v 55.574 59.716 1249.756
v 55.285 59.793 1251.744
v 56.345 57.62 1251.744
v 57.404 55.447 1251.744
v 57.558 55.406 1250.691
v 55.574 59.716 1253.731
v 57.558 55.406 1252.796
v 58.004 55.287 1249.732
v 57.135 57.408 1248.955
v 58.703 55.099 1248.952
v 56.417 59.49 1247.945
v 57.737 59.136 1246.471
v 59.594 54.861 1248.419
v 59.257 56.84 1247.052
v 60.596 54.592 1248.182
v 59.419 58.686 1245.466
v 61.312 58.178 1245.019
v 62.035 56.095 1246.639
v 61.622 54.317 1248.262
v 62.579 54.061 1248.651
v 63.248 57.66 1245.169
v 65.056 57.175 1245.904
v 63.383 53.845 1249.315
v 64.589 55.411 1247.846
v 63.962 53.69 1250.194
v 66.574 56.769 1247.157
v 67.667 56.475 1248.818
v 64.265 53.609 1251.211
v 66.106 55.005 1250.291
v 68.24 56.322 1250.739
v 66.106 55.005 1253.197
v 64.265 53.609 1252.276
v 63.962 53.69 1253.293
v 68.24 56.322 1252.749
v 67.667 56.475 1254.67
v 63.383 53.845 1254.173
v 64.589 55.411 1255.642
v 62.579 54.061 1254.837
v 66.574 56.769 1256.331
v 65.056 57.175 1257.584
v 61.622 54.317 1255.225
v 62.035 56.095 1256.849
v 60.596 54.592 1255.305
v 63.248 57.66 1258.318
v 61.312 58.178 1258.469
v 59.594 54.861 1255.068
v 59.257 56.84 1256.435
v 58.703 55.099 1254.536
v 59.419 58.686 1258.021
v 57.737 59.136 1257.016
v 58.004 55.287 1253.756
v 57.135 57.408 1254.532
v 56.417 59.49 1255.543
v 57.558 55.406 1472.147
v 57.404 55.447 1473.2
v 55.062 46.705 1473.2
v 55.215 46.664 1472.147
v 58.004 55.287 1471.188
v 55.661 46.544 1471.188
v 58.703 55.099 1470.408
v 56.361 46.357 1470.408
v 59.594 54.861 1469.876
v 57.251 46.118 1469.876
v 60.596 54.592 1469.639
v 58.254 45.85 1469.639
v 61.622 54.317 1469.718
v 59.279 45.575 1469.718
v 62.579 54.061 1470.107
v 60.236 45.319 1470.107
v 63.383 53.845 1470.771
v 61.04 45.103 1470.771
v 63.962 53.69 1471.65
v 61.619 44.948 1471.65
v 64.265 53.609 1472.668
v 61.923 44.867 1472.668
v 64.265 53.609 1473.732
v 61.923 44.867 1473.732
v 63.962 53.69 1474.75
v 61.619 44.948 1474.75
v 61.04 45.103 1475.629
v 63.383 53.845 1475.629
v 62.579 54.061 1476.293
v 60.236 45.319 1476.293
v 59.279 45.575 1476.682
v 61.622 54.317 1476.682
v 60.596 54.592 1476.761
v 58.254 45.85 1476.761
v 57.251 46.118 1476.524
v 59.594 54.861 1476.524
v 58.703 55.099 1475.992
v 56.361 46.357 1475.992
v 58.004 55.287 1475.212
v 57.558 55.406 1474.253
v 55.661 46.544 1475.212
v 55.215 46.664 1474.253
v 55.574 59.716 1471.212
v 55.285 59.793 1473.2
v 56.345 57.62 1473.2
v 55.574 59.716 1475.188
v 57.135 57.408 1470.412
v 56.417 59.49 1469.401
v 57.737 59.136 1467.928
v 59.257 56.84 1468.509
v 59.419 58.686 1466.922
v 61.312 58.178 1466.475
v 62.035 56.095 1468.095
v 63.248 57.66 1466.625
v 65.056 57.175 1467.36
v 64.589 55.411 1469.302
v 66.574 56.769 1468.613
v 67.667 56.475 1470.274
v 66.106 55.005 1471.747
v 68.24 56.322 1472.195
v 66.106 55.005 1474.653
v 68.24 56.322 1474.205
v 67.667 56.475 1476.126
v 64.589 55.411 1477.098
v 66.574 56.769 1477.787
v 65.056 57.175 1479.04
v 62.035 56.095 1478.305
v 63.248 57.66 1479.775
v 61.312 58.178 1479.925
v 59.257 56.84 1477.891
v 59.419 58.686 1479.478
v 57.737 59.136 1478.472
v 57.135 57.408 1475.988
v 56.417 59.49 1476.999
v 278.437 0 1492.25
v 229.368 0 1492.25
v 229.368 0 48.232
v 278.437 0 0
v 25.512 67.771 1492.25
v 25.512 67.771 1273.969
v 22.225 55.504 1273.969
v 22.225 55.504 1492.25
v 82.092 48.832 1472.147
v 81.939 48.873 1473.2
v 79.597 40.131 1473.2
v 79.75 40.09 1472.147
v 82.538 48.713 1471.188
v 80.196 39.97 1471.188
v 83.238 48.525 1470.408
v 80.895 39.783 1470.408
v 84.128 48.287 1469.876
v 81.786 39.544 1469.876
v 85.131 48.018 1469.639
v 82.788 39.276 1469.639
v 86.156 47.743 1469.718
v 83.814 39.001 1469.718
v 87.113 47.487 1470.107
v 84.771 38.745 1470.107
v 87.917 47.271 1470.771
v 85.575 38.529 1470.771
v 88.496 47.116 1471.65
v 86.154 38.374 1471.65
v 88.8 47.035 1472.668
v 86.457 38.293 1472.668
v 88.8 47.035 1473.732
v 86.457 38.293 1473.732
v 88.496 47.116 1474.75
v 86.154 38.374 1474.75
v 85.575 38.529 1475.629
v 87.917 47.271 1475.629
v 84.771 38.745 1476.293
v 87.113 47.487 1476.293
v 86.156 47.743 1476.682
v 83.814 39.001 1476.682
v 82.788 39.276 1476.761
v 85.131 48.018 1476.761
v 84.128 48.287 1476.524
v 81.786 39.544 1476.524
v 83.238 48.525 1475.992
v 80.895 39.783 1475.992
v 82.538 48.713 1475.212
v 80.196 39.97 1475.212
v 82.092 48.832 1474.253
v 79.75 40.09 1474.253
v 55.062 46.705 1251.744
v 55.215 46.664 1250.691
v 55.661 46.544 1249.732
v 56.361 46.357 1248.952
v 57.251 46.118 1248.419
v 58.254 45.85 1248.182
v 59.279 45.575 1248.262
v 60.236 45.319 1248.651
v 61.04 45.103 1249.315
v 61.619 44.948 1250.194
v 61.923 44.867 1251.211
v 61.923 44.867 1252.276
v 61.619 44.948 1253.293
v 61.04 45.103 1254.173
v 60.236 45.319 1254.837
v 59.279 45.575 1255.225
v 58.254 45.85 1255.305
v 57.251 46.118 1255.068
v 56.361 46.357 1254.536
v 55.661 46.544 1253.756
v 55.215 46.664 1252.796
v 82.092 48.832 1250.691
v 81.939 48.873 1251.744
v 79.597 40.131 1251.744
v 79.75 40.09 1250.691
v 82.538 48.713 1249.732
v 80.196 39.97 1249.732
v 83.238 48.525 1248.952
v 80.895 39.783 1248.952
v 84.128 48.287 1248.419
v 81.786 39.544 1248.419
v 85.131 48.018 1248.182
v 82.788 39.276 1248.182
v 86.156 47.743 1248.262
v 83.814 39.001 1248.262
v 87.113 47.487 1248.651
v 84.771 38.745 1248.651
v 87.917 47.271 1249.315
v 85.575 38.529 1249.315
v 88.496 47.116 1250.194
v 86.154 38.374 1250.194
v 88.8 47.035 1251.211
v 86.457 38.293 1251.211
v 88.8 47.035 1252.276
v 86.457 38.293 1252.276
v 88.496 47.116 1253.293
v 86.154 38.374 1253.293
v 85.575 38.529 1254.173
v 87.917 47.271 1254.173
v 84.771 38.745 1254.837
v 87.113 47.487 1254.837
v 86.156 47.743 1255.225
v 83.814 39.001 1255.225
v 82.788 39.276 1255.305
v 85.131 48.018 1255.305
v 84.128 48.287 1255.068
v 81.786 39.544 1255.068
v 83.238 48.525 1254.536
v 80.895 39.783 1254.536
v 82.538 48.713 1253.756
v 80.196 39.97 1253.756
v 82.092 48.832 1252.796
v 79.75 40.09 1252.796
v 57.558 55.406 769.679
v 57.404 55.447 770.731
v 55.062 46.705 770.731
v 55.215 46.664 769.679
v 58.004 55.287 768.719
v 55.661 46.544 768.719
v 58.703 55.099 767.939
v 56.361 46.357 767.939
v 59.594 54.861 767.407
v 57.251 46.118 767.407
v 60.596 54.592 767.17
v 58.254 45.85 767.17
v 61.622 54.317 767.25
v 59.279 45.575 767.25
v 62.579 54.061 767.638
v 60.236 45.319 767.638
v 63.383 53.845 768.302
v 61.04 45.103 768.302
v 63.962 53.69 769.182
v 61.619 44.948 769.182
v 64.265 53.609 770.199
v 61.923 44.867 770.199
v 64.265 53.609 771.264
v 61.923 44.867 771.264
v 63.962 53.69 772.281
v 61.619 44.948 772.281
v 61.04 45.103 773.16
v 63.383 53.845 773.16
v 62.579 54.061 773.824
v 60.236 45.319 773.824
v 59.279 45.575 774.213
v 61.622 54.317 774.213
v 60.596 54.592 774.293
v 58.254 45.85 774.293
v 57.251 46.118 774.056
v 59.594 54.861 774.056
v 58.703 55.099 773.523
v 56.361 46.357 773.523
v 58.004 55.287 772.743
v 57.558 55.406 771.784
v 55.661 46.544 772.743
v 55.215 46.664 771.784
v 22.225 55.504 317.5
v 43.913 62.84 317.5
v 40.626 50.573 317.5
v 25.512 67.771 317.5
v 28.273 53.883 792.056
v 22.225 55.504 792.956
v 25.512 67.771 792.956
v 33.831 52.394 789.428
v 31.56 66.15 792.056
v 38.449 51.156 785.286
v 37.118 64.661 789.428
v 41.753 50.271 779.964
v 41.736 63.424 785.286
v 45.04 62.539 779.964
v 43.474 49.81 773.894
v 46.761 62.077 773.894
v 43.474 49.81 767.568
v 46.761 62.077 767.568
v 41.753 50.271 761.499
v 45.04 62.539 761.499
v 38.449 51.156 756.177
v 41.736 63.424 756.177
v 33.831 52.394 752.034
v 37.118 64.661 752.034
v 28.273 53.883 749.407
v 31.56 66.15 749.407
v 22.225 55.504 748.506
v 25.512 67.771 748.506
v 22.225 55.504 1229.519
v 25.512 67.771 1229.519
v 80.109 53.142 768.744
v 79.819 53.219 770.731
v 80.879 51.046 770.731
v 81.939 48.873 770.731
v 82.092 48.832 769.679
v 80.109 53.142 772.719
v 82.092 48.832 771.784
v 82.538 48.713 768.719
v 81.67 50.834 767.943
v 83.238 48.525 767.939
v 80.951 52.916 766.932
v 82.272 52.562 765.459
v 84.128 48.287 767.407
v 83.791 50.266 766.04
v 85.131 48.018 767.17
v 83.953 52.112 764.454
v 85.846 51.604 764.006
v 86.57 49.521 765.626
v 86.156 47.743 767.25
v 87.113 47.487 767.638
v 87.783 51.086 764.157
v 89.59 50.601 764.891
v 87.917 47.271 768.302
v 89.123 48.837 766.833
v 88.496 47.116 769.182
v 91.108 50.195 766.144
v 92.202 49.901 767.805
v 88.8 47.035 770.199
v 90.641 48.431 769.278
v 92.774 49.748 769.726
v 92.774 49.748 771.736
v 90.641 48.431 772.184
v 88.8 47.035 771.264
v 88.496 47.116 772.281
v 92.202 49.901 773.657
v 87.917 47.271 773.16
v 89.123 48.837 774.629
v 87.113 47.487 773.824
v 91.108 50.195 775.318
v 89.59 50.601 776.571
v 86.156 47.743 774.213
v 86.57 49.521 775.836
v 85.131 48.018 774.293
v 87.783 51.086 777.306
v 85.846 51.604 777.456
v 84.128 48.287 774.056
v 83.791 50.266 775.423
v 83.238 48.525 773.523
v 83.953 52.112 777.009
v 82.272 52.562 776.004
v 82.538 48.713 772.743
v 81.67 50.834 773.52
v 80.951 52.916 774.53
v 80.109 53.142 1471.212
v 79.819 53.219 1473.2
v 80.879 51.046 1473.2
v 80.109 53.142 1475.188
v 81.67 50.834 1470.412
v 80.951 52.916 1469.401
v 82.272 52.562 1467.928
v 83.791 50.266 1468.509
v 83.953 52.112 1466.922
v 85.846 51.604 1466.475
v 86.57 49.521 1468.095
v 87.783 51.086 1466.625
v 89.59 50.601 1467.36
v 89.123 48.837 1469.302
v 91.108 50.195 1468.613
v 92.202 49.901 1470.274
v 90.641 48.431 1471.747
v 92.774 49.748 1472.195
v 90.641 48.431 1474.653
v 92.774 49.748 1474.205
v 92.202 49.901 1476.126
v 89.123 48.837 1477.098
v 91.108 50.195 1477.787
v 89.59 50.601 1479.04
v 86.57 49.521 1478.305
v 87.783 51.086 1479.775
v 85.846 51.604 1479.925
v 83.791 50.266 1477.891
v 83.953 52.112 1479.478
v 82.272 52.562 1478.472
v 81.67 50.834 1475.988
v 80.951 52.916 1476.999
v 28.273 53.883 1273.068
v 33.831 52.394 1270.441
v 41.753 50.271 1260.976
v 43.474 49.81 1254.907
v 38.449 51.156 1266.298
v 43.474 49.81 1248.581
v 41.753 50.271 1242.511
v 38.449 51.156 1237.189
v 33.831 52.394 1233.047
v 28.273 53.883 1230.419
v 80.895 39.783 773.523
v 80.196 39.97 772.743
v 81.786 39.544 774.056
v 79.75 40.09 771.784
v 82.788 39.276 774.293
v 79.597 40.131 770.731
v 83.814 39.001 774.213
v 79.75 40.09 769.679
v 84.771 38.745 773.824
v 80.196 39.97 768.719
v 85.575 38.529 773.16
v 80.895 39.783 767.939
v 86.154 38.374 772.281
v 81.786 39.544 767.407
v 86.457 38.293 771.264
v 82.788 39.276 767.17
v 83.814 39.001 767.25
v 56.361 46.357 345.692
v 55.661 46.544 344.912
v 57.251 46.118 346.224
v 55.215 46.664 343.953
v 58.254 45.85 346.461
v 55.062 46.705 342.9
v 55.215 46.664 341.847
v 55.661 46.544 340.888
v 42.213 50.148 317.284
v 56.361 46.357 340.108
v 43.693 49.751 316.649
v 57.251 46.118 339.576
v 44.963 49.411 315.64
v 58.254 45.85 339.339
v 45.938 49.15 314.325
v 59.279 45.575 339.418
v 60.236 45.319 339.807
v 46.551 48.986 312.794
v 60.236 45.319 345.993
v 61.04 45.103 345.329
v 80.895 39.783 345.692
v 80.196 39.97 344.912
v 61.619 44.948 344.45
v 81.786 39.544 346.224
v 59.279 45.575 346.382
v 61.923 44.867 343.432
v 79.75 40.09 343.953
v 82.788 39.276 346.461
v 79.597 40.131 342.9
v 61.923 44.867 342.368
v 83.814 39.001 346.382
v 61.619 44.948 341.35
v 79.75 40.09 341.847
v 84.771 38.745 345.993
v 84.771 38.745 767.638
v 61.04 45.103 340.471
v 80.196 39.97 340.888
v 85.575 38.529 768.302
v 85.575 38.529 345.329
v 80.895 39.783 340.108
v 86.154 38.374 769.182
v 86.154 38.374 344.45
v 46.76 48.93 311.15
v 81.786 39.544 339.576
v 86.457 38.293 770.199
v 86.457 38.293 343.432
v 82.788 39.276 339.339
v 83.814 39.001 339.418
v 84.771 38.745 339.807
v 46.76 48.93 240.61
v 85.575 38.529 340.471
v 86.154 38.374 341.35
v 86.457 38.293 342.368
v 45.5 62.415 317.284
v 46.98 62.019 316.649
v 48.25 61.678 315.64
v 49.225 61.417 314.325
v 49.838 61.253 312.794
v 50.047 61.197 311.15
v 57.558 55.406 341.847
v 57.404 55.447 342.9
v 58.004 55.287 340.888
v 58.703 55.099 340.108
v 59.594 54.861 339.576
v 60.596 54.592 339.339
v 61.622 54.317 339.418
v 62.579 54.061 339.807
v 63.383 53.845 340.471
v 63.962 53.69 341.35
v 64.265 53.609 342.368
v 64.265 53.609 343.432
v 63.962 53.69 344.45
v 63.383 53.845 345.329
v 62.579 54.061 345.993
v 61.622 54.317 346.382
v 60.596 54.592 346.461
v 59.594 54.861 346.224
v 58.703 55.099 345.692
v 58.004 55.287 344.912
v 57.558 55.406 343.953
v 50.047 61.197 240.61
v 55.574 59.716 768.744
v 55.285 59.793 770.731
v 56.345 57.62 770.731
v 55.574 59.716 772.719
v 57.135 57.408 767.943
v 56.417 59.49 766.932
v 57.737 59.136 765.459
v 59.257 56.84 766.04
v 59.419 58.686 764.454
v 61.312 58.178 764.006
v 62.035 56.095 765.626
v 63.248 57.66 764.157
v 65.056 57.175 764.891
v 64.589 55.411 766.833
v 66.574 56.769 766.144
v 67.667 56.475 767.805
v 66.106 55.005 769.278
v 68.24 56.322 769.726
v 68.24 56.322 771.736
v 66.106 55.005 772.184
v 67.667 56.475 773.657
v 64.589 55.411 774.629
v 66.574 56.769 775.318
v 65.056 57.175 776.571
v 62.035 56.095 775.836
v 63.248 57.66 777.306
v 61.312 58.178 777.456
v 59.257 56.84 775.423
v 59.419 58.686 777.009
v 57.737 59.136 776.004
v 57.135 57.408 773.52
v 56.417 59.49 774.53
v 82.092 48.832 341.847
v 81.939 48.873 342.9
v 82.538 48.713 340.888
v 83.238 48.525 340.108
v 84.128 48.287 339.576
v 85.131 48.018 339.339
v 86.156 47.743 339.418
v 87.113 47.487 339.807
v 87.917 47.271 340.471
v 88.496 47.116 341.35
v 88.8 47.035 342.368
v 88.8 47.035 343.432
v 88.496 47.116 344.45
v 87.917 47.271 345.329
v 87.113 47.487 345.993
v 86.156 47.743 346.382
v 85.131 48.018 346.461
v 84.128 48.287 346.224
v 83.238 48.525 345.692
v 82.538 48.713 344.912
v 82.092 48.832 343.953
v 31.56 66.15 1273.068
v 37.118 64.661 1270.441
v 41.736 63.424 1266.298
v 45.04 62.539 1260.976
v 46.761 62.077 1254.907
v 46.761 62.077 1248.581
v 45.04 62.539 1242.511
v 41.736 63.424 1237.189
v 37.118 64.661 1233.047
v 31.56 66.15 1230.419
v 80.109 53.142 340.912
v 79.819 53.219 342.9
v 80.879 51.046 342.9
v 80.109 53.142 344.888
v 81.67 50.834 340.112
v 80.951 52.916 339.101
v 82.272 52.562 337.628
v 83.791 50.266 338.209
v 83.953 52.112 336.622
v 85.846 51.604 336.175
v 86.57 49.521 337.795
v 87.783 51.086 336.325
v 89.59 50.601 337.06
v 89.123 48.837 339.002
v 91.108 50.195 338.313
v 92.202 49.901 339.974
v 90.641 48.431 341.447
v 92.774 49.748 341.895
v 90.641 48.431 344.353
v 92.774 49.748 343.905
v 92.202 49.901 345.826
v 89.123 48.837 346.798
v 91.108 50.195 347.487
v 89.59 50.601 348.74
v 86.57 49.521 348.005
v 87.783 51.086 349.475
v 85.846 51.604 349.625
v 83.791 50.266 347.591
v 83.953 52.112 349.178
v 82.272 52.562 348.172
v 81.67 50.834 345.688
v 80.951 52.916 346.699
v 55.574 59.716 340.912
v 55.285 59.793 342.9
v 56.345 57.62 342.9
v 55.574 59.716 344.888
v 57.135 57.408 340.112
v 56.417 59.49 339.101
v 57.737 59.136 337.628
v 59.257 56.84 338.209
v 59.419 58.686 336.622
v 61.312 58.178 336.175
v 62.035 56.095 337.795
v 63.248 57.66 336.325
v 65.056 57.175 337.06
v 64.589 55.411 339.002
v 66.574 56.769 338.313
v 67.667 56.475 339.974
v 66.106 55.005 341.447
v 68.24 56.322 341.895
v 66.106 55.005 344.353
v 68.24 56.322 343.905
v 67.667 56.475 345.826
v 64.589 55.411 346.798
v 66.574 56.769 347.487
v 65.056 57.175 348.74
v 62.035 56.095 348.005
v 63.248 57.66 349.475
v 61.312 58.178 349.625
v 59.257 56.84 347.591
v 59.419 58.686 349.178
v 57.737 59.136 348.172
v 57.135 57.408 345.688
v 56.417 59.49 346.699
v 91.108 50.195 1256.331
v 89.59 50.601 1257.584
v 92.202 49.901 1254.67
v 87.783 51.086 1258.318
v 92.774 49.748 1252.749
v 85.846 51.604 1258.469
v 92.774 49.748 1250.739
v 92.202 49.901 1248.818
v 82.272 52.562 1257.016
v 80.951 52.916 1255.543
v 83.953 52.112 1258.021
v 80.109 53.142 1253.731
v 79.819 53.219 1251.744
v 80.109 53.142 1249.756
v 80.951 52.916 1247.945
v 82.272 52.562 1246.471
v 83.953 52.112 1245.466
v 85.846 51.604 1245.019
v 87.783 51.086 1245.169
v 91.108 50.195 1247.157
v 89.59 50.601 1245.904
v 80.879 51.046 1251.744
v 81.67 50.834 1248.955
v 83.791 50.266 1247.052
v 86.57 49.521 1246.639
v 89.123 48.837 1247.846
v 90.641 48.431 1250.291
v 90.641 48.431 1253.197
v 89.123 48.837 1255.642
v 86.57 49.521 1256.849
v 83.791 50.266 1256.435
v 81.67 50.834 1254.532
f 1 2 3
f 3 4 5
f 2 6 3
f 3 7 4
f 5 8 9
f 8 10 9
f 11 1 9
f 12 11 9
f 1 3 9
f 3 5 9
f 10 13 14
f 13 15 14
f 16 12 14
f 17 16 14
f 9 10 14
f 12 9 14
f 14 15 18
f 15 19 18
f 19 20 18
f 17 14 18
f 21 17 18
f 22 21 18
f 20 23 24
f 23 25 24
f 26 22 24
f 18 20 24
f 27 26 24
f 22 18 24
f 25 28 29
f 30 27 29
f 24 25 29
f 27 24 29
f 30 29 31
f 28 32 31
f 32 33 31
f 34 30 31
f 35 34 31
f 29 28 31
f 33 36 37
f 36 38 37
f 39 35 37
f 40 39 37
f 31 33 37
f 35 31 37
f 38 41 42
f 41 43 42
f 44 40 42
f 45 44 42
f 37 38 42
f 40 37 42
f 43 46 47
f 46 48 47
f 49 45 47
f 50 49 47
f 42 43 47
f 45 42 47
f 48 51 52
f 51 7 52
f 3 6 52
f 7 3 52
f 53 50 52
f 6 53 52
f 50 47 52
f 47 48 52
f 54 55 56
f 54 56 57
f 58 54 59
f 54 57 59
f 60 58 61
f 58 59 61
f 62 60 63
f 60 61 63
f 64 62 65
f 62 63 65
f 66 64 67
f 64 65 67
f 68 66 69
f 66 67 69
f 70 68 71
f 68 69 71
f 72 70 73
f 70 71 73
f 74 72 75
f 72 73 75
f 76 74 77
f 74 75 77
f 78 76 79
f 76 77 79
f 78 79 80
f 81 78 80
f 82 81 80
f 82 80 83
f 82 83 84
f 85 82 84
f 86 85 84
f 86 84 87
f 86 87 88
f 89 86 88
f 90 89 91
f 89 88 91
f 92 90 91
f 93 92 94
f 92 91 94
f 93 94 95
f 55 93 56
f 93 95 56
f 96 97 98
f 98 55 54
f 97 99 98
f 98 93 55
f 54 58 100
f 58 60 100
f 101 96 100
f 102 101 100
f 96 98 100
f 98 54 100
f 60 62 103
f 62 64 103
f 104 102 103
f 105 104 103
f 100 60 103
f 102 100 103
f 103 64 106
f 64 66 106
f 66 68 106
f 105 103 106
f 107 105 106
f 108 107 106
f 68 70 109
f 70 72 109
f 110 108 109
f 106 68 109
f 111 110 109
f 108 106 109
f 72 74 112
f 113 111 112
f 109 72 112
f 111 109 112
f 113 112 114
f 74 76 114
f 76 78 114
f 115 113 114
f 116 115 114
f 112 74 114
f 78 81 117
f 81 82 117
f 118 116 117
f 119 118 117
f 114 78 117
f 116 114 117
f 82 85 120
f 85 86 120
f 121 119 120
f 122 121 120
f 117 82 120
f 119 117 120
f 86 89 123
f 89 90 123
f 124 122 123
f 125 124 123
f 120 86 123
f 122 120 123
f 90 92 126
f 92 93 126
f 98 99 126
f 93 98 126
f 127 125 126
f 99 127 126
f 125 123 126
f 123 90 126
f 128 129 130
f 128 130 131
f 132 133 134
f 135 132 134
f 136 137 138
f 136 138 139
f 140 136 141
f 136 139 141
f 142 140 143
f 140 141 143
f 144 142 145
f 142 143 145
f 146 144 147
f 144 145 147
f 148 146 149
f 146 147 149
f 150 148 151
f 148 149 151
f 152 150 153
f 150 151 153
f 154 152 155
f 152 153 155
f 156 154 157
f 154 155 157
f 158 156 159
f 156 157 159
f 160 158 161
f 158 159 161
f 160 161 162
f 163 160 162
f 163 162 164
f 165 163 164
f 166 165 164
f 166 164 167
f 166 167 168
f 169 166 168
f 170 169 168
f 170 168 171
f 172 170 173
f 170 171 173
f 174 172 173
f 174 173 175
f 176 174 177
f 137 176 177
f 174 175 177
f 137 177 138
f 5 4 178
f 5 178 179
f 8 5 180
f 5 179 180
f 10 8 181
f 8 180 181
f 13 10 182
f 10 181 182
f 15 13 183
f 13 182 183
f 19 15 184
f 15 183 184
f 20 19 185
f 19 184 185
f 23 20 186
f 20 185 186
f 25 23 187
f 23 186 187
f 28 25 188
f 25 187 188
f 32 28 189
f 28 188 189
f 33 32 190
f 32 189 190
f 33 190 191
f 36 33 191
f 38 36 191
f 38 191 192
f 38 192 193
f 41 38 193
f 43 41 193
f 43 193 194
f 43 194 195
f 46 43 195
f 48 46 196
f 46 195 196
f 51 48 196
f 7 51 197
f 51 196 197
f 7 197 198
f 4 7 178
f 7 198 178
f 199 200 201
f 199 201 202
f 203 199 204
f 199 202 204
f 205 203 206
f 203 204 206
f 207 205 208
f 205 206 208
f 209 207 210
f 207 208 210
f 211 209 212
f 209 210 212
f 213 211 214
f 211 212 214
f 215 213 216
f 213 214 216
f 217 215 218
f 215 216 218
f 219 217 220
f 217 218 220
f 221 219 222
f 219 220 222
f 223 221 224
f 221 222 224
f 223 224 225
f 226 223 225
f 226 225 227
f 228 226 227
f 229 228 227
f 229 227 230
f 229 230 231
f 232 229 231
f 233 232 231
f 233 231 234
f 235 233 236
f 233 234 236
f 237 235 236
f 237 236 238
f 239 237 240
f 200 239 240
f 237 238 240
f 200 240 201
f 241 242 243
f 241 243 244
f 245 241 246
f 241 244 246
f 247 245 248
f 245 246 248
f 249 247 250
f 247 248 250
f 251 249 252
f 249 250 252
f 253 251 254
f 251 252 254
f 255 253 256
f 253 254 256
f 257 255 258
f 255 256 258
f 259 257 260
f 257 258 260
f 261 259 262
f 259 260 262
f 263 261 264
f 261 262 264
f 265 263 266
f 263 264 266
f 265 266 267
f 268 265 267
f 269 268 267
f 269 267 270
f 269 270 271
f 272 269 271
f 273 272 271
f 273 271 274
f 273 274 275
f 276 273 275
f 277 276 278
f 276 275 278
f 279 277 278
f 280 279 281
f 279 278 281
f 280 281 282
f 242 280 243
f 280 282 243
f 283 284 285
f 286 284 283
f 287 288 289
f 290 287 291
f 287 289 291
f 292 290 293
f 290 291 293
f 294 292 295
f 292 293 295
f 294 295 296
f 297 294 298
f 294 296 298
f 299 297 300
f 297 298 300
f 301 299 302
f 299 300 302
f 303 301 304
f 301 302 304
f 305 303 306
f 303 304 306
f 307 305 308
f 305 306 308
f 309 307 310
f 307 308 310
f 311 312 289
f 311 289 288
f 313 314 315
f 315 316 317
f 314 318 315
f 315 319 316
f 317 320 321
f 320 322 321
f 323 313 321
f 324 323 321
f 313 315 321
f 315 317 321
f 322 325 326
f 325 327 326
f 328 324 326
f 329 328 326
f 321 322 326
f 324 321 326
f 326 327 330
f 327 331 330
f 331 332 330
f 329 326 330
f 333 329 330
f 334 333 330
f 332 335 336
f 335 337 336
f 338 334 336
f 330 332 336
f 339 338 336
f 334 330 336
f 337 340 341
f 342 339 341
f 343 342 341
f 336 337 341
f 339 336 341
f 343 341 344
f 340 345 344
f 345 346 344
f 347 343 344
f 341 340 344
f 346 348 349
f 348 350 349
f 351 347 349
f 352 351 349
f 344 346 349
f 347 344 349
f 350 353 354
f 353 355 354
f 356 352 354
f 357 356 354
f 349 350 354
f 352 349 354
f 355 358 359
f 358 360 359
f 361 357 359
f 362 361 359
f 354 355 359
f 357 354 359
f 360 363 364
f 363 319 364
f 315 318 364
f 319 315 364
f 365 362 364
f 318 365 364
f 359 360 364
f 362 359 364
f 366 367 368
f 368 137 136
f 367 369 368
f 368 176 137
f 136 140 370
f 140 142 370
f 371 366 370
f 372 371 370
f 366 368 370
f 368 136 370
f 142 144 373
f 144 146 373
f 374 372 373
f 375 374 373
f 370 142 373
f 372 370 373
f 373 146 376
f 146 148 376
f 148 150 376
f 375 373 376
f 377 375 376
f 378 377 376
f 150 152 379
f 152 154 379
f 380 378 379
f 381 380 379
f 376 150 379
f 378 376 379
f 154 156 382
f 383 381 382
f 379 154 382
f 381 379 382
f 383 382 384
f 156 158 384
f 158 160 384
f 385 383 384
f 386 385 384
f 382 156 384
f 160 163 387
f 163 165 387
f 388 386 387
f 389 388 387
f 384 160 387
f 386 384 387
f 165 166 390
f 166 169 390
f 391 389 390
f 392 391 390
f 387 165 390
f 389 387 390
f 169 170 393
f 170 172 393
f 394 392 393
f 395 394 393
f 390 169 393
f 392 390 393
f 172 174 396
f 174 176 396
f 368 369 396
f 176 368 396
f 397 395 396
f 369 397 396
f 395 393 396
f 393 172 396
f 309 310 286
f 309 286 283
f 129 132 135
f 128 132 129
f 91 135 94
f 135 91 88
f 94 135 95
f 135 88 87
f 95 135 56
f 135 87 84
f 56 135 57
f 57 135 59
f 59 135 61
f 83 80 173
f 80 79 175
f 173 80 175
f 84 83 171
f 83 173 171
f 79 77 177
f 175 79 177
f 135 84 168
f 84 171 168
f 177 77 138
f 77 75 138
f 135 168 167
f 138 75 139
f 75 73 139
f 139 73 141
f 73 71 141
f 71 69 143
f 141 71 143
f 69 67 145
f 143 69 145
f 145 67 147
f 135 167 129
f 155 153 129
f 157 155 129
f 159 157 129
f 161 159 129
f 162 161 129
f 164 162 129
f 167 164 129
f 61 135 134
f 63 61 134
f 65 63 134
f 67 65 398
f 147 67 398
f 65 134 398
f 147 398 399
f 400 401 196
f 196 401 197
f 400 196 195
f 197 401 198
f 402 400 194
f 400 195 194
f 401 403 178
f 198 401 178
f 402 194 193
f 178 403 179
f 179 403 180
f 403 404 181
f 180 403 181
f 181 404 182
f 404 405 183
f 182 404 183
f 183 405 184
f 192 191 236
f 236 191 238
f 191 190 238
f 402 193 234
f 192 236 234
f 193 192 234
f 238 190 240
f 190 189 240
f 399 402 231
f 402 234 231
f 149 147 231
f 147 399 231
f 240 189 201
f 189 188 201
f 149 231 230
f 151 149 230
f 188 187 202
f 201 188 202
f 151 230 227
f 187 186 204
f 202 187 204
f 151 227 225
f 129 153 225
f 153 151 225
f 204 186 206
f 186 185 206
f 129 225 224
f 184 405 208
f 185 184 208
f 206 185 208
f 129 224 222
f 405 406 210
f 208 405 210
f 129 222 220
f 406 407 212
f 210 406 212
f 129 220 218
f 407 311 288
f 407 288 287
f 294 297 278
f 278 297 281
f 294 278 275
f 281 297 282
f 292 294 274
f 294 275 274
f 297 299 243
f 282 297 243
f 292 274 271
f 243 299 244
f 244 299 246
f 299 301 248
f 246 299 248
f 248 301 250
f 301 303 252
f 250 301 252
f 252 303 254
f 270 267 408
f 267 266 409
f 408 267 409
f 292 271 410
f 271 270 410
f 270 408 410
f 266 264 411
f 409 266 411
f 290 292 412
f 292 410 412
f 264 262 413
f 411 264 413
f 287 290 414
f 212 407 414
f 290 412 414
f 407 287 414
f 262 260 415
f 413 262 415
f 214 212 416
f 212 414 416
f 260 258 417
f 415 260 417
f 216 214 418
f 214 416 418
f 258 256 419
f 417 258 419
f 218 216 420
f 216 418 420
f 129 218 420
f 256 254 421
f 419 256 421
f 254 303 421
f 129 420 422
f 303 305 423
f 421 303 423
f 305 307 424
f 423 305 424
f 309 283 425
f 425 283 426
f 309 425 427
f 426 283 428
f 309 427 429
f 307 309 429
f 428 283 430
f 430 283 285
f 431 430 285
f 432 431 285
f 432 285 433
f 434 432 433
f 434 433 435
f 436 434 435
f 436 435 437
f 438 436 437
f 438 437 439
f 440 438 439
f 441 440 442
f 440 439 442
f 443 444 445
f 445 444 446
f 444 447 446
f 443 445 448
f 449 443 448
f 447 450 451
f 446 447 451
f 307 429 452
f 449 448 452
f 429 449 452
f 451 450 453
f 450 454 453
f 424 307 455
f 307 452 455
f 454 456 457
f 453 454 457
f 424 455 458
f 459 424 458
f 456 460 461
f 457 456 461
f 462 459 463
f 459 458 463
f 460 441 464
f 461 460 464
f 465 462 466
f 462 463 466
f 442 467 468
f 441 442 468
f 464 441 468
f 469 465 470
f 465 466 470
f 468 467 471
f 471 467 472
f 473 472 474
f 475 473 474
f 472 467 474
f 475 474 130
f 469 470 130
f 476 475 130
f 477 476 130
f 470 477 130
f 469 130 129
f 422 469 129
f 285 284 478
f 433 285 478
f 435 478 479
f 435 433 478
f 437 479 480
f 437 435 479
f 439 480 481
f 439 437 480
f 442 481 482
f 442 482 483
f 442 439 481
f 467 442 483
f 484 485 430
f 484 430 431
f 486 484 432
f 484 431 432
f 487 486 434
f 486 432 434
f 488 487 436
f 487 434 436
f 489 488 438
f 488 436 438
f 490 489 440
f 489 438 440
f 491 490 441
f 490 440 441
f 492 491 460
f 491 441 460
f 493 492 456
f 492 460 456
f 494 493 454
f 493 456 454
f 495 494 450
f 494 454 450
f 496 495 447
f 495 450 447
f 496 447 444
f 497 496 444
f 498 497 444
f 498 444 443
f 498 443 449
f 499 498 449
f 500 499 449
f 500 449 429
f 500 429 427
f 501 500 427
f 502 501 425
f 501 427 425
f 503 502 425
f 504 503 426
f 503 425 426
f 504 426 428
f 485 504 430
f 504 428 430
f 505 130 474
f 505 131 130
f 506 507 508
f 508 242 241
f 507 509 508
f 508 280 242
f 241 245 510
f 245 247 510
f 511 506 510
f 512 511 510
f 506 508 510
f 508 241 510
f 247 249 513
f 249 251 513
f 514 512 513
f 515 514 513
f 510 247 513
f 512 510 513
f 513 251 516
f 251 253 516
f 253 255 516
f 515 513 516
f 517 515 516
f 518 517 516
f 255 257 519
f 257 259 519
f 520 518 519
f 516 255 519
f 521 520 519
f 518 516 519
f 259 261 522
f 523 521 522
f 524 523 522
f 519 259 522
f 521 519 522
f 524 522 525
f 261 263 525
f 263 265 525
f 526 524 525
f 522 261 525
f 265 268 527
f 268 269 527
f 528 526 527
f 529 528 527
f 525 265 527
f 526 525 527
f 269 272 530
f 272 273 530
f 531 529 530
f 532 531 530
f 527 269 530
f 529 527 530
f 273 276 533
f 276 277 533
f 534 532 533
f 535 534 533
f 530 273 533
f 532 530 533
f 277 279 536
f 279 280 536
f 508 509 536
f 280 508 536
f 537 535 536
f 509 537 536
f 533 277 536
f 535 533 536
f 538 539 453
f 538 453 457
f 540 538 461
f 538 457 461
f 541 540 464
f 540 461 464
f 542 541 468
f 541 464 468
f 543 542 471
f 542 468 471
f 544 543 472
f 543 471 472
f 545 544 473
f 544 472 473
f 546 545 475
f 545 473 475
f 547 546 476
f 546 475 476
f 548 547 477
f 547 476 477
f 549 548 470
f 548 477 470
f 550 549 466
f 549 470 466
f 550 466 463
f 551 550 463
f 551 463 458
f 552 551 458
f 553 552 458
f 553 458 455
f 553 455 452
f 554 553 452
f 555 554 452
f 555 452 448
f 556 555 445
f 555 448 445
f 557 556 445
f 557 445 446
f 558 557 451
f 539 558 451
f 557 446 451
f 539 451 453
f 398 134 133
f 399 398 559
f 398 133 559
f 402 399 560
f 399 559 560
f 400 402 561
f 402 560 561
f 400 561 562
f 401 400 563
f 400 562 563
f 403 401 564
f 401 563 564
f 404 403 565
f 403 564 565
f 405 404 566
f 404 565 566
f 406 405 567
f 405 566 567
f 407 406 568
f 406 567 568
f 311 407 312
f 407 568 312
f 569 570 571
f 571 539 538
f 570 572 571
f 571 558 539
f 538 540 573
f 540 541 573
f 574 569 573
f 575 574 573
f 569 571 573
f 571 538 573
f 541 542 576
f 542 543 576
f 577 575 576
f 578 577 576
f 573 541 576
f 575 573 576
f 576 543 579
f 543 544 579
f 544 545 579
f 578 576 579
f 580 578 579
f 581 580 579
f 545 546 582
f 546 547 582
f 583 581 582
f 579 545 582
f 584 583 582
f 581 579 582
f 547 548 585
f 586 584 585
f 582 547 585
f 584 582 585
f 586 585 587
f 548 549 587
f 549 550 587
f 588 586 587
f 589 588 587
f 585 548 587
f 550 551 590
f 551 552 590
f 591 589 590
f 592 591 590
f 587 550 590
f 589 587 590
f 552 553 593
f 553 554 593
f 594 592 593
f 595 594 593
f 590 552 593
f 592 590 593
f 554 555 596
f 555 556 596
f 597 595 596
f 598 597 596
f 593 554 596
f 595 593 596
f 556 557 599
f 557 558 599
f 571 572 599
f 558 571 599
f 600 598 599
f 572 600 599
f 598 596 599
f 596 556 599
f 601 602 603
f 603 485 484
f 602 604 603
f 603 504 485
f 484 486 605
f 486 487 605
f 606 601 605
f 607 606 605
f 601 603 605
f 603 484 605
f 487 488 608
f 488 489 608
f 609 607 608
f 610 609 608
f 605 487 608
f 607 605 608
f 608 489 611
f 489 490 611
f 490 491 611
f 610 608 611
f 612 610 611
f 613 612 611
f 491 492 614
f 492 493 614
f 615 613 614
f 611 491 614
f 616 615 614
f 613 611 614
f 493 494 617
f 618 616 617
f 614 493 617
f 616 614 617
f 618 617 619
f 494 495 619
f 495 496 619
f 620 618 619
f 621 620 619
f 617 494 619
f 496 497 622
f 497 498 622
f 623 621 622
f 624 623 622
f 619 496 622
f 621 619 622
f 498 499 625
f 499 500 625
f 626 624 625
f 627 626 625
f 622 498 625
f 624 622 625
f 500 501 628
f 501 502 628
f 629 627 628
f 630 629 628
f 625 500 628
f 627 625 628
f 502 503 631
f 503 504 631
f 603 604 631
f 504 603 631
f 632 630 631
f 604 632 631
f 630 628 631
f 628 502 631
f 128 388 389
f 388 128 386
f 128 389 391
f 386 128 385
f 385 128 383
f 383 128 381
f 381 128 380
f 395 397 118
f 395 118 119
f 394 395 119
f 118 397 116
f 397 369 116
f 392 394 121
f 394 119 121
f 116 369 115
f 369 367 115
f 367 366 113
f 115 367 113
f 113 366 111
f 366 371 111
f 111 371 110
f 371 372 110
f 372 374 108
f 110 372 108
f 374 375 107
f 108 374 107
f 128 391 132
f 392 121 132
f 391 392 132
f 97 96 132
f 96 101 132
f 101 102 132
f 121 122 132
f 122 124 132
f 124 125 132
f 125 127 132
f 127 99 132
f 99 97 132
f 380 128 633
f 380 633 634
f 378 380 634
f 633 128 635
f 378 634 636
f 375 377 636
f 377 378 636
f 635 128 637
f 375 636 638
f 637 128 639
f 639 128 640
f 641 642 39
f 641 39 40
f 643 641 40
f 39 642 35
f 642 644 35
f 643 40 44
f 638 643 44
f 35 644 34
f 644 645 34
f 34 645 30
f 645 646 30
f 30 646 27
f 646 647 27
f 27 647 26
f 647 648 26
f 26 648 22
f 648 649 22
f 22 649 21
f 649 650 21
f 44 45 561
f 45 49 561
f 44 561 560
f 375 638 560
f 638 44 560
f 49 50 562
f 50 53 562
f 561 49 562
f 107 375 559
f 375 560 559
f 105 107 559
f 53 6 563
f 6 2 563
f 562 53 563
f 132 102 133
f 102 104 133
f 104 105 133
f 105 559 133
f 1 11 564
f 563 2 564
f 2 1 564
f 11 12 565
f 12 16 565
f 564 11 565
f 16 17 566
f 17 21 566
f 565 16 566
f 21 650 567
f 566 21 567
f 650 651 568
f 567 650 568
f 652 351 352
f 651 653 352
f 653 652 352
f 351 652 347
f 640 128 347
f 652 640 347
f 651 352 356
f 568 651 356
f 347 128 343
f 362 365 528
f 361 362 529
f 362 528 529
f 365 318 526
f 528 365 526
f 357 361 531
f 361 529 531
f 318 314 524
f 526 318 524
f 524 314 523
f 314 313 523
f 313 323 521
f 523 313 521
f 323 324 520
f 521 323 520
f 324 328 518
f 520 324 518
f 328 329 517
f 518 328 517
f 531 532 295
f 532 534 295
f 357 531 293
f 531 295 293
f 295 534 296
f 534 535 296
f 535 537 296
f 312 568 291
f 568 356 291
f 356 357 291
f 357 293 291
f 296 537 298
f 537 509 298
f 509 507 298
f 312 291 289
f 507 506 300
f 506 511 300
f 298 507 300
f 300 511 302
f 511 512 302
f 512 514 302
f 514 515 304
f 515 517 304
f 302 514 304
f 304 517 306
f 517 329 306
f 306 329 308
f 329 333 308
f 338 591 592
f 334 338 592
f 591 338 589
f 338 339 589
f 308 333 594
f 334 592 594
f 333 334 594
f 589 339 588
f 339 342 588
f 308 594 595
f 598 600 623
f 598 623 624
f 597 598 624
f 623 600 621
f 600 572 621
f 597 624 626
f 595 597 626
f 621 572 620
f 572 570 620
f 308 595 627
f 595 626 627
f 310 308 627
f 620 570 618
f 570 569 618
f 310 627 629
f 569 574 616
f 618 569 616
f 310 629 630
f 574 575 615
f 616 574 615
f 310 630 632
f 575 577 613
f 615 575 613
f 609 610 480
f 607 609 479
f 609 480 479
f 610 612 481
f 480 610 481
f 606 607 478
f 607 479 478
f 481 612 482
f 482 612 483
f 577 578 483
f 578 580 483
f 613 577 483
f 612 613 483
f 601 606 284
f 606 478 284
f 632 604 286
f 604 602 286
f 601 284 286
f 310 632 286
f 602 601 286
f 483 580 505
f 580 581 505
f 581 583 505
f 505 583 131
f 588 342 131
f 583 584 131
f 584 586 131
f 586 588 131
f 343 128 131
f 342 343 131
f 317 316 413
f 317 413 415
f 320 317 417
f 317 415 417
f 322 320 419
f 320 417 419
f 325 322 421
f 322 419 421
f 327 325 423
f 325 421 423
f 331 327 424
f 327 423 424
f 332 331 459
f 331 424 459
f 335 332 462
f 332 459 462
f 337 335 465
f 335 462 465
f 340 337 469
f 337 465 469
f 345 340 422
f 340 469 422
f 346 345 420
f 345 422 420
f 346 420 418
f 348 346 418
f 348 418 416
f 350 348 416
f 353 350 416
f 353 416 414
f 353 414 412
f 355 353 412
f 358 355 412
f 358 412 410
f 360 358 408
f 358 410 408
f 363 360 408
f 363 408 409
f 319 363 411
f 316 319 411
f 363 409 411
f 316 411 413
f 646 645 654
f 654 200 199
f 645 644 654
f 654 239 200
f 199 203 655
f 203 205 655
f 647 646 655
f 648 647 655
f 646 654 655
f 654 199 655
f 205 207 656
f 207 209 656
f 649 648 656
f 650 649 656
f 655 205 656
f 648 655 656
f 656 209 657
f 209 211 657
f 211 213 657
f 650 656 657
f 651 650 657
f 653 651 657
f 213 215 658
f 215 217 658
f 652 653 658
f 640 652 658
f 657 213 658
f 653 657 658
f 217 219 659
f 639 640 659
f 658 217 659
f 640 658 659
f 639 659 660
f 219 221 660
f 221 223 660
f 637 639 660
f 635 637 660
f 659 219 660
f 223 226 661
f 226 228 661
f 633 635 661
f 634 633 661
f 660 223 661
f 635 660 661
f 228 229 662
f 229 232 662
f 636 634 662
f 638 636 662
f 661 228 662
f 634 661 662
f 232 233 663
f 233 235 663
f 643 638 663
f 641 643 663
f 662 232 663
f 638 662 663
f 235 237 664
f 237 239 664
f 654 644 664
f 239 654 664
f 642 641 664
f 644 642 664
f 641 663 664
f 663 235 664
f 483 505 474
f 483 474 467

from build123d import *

# Parameters (mm, degrees)
BOSS_EXTRUDE1_DEPTH                                 = 1492.25
CSK_FOR_1_4_FLAT_HEAD_SOCKET_CAP_SCREW1_D           = 7.14248
CSK_FOR_1_4_FLAT_HEAD_SOCKET_CAP_SCREW1_CSINK_D     = 13.4874
CSK_FOR_1_4_FLAT_HEAD_SOCKET_CAP_SCREW1_CSINK_ANGLE = 82
SKETCH4_R                                           = 22.225
CUT_EXTRUDE1_DEPTH                                  = 67.312434508
CUT_EXTRUDE2_DEPTH                                  = 67.312434508
FILLET1_R                                           = 6.35


with BuildPart() as part:
    # Sketch1 → Boss-Extrude1 (new body)
    with BuildSketch(Plane.XY):
        Polygon((22.225, 55.50367642), (229.367540407, 0), (278.436572382, 0), (25.512001873, 67.770934414), align=None)
    extrude(amount=BOSS_EXTRUDE1_DEPTH)

    # CSK for 1/4 Flat Head Socket Cap Screw1 (through all)
    with Locations(Plane(origin=(18.651713678, 69.609143096, 0), x_dir=(0.965925826, -0.258819045, 0), z_dir=(0.258819045, 0.965925826, 0))):
        with Locations((44.668892959, -1251.74375), (70.068892959, -1251.74375), (44.668892959, -770.73125), (70.068892959, -770.73125), (44.668892959, -1473.2), (70.068892959, -1473.2), (44.668892959, -342.9), (70.068892959, -342.9)):
            CounterSinkHole(CSK_FOR_1_4_FLAT_HEAD_SOCKET_CAP_SCREW1_D / 2, CSK_FOR_1_4_FLAT_HEAD_SOCKET_CAP_SCREW1_CSINK_D / 2, counter_sink_angle=CSK_FOR_1_4_FLAT_HEAD_SOCKET_CAP_SCREW1_CSINK_ANGLE)

    # Sketch4 → Cut-Extrude1 (cut, through all)
    with BuildSketch(Plane(origin=(18.651713678, 69.609143096, 0), x_dir=(0.965925826, -0.258819045, 0), z_dir=(0.258819045, 0.965925826, 0))):
        with Locations((7.102292959, -770.73125)):
            Circle(SKETCH4_R)
        with Locations((7.102292959, -1251.74375)):
            Circle(SKETCH4_R)
    extrude(amount=-CUT_EXTRUDE1_DEPTH, mode=Mode.SUBTRACT)

    # Sketch5 → Cut-Extrude2 (cut, through all)
    with BuildSketch(Plane(origin=(18.651713678, 69.609143096, 0), x_dir=(0.965925826, -0.258819045, 0), z_dir=(0.258819045, 0.965925826, 0))):
        Polygon((7.102292959, -317.5), (7.102292959, 0), (268.949076248, 0), (32.502292959, -240.609994719), (32.502292959, -317.5), align=None)
    extrude(amount=-CUT_EXTRUDE2_DEPTH, mode=Mode.SUBTRACT)

    # Fillet1
    fillet1_edges = [part.edges().sort_by_distance(p)[0] for p in [
        (48.403016924, 55.063301672, 317.5),
    ]]
    fillet(fillet1_edges, radius=FILLET1_R)


solid = part.part
